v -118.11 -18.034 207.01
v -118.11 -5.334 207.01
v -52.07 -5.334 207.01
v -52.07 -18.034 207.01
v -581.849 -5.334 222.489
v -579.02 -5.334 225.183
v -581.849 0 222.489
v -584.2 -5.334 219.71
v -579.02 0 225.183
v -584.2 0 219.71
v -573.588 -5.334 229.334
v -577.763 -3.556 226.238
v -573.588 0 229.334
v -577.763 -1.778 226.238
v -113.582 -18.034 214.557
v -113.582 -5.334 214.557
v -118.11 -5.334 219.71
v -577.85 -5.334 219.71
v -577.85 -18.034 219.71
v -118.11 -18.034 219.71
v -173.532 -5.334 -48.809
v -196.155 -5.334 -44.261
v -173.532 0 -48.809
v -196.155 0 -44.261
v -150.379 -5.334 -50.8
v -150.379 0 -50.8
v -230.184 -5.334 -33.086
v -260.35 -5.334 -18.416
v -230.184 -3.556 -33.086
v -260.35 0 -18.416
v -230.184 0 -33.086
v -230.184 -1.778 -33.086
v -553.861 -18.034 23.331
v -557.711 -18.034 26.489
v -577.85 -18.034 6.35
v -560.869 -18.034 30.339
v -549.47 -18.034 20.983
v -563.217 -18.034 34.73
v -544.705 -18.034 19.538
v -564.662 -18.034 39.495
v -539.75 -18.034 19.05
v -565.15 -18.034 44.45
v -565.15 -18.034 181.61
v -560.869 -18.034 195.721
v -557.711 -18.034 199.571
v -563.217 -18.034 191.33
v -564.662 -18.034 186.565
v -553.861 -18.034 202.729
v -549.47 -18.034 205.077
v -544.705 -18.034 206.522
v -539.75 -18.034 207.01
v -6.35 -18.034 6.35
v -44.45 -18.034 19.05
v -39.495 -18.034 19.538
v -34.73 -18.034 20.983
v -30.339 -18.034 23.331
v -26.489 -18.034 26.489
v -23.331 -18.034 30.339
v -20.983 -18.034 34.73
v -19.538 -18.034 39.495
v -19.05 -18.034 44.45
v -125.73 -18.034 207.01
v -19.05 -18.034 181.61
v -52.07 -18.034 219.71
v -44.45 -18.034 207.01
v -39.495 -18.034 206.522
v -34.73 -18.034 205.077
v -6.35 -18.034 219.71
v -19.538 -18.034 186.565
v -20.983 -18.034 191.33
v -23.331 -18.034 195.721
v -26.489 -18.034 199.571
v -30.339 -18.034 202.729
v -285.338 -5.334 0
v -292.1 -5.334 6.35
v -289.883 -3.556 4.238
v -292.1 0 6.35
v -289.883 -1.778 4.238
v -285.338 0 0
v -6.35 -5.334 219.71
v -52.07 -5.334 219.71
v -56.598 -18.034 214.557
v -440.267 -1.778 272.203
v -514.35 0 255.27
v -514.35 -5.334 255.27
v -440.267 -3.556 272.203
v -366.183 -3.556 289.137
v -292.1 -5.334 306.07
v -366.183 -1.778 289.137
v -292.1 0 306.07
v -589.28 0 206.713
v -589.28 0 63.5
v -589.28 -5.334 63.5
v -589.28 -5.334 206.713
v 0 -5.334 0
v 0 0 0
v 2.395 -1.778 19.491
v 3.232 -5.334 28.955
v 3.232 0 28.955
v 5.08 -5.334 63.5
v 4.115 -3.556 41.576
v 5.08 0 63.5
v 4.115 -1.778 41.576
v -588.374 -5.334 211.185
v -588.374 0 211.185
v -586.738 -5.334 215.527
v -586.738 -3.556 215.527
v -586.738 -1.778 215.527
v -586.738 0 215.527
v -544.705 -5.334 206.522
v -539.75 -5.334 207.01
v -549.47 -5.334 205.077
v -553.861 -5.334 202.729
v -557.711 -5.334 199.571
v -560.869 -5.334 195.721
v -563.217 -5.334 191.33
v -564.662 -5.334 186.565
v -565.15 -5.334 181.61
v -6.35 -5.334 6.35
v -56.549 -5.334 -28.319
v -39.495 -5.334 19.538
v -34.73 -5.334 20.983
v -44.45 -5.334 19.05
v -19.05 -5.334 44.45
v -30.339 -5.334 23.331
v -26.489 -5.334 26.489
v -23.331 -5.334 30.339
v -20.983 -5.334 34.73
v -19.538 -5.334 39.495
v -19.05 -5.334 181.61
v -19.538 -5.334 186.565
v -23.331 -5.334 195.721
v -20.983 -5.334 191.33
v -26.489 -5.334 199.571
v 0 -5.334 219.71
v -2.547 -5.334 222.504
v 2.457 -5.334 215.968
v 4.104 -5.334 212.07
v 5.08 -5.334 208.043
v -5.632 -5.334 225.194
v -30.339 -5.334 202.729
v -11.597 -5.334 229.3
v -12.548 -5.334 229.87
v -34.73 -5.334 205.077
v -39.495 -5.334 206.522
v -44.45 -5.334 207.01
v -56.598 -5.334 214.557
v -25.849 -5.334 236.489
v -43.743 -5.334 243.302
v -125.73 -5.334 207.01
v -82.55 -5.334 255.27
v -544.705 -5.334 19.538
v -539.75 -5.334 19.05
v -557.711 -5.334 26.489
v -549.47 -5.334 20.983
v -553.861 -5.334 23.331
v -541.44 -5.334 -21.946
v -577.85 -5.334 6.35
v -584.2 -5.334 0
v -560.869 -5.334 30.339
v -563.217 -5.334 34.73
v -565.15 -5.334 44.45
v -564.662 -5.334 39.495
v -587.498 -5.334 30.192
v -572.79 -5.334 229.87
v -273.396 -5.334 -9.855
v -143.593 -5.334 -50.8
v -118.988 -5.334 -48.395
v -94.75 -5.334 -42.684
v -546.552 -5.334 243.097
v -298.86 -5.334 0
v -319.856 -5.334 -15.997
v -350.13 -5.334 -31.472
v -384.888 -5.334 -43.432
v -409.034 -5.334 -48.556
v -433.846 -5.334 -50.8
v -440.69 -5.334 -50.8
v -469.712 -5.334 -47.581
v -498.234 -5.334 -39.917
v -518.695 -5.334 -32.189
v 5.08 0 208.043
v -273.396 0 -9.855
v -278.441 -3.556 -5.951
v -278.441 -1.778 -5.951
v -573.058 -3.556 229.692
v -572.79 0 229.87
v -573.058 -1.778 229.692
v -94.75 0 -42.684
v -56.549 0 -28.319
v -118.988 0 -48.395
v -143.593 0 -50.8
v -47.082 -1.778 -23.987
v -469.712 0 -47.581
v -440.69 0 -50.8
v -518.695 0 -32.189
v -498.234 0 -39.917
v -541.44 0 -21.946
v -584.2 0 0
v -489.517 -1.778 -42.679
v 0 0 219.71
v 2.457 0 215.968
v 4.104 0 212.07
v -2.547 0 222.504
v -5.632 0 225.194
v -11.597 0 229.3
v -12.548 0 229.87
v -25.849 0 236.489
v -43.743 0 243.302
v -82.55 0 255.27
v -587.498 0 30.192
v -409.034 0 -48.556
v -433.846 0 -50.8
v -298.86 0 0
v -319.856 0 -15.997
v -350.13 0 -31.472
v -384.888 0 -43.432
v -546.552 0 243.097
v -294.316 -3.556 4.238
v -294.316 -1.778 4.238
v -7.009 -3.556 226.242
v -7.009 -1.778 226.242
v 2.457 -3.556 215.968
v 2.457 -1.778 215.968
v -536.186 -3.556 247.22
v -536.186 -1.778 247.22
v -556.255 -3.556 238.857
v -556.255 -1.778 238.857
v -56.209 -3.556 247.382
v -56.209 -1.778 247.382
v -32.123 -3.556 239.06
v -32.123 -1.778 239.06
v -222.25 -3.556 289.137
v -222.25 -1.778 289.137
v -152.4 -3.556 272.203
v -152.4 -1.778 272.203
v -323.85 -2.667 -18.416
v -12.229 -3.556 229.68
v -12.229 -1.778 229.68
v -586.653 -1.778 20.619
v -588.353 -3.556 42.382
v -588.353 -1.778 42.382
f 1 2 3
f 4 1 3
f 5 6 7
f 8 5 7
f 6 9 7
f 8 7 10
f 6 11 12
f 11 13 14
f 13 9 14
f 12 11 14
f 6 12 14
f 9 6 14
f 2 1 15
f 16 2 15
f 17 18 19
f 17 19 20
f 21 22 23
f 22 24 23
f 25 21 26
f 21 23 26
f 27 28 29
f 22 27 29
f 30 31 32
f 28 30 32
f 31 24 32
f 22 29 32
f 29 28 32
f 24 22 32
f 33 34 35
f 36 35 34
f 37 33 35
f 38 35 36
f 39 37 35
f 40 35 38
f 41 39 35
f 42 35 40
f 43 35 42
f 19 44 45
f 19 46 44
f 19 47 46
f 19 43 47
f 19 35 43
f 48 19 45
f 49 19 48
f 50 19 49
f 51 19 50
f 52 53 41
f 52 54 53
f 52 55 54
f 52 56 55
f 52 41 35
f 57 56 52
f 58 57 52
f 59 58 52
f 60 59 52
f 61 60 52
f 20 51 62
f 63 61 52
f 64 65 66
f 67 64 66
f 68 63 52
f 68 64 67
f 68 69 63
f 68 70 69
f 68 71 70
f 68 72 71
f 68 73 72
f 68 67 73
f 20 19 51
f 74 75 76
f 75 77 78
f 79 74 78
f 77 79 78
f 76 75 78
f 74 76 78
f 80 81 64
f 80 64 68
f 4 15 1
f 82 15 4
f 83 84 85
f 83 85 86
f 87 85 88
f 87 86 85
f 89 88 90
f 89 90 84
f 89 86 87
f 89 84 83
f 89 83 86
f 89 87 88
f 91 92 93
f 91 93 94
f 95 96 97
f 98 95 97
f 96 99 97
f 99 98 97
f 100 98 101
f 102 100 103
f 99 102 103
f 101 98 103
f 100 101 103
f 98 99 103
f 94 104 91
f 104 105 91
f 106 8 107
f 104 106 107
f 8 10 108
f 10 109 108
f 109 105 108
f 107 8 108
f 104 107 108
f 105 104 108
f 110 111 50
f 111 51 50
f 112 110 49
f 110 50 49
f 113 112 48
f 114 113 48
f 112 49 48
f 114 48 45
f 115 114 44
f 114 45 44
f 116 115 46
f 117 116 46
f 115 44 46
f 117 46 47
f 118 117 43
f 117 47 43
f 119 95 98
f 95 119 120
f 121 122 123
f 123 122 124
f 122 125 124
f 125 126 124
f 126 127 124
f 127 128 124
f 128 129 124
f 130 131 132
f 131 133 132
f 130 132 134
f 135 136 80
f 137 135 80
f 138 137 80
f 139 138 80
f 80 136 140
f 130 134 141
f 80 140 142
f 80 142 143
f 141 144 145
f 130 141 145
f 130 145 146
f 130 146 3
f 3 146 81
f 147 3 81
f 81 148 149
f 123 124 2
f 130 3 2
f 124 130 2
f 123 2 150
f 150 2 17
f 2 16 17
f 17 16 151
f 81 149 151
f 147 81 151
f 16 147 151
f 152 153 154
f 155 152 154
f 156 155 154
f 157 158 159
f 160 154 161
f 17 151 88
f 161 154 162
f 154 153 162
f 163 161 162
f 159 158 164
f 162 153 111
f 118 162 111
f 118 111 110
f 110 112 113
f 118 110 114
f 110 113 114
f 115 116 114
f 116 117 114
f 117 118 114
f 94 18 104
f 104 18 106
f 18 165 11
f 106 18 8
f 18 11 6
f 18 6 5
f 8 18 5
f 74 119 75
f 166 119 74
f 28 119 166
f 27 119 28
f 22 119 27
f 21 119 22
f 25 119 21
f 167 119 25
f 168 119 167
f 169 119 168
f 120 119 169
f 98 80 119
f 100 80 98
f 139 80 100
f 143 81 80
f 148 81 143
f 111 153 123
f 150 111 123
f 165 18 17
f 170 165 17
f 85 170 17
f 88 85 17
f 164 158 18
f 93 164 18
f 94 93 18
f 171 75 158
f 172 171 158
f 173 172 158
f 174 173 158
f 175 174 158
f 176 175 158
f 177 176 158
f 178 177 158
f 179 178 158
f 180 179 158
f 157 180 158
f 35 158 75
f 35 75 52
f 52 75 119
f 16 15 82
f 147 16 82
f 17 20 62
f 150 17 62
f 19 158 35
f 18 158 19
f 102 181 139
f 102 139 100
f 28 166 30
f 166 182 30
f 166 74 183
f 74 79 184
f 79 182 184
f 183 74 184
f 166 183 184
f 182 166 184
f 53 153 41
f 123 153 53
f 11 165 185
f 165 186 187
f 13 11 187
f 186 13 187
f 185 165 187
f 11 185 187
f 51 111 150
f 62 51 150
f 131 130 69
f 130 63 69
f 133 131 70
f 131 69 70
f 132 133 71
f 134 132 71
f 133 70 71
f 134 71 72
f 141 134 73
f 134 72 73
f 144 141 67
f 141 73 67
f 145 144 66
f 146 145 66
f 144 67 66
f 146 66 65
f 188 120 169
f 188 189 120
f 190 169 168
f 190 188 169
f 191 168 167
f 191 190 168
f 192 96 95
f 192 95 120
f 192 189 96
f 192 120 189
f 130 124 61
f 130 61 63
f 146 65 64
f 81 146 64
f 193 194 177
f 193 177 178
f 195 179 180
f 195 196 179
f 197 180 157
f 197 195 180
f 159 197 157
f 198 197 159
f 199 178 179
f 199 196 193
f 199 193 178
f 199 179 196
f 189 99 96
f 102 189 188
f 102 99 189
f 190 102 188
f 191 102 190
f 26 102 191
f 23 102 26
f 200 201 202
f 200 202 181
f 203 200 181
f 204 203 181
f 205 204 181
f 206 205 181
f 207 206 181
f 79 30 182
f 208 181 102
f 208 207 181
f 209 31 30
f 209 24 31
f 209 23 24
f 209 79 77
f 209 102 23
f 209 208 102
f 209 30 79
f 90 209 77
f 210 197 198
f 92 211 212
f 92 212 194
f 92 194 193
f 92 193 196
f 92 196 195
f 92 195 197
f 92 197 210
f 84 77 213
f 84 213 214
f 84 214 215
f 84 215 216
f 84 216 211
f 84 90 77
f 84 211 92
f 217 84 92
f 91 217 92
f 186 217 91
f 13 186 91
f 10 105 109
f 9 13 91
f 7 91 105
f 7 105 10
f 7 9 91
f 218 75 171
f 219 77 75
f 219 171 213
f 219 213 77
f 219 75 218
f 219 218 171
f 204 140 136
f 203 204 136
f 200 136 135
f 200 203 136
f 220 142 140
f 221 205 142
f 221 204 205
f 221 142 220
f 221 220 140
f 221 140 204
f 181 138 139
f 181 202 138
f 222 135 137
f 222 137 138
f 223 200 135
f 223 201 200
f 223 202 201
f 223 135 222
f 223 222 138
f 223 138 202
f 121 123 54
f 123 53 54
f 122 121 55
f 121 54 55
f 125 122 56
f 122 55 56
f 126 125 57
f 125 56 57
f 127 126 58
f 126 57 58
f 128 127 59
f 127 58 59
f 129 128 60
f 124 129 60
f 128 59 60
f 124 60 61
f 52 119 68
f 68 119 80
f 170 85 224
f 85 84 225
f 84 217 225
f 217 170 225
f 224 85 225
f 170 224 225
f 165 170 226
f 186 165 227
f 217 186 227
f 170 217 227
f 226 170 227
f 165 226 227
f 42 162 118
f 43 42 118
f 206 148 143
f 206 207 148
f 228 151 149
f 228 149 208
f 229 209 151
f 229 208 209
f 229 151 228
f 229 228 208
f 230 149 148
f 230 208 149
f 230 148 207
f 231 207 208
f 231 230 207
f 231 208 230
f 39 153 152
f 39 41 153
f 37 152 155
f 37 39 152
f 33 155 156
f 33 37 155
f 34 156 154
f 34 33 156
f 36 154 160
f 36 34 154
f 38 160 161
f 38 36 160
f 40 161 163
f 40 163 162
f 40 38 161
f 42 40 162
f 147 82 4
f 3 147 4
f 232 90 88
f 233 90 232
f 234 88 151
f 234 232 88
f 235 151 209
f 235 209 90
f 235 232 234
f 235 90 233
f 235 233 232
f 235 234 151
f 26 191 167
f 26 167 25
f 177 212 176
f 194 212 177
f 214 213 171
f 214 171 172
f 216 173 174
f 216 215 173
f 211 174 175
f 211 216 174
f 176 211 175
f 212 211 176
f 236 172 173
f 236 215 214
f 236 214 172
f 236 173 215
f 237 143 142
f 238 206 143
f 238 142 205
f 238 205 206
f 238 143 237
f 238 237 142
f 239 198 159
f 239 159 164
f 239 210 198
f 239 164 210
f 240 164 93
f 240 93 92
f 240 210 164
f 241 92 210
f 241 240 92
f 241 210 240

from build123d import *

# Parameters (mm, degrees)
F0_W     = 584.2
F0_H     = 219.71
F1_DEPTH = 5.334
F2_W     = 571.5
F2_H     = 213.36
F2_W_2   = 546.1
F2_H_2   = 187.96
F3_DEPTH = 12.7
F4_R     = 25.4
F6_DEPTH = 12.7
F8_DEPTH = 5.334
F9_DEPTH = 5.334


# Not quite as in the source:
# - a feature names something its author has since deleted; it is built from what else it names


with BuildPart() as f1:
    # F0 (on Front) → F1 (new body)
    with BuildSketch(Plane.XZ):
        with Locations((-292.1, 109.855)):
            Rectangle(F0_W, F0_H)
    extrude(amount=F1_DEPTH)

    # F2 (on face) → F3 (join)
    with BuildSketch(Plane.XZ.offset(5.334)):
        with Locations((-292.1, 113.03)):
            Rectangle(F2_W, F2_H)
        with Locations((-292.1, 113.03)):
            Rectangle(F2_W_2, F2_H_2, mode=Mode.SUBTRACT)
    extrude(amount=F3_DEPTH)

    # F4
    f4_edges = [f1.edges().sort_by_distance(p)[0] for p in [
        (-565.15, -11.684, 207.01),
        (-19.05, -11.684, 207.01),
        (-19.05, -11.684, 19.05),
        (-565.15, -11.684, 19.05),
    ]]
    fillet(f4_edges, radius=F4_R)

    # F5 (on face) → F6 (cut)
    with BuildSketch(Plane.XZ.offset(18.034)):
        Polygon((-118.11, 219.71), (-125.73, 207.01), (-118.11, 207.01), (-113.5820166854, 214.5566388576), (-110.49, 219.71), align=None)
        Polygon((-56.5979833146, 214.5566388576), (-52.07, 207.01), (-44.45, 207.01), (-52.07, 219.71), (-59.69, 219.71), align=None)
        Polygon((-59.69, 219.71), (-110.49, 219.71), (-113.5820166854, 214.5566388576), (-56.5979833146, 214.5566388576), align=None)
    extrude(amount=-F6_DEPTH, mode=Mode.SUBTRACT)

    # F7 (on face) → F8 (cut)
    with BuildSketch(Plane(origin=(0, 0, 0), x_dir=(-1, 0, 0), z_dir=(0, 1, 0))):
        with BuildLine():
            add(Edge.make_bspline(
                [(292.1, 6.35), (289.8878914708, 4.2388101088), (287.6757829415, 2.1276202176), (285.3383261504, 0)],
                knots=[0, 0, 0, 0, 0.0566650496, 0.0566650496, 0.0566650496, 0.0566650496], degree=3))
            Line((285.3383261504, 0), (292.1, 0))
            Line((292.1, 0), (292.1, 6.35))
        make_face()
        with BuildLine():
            add(Edge.make_bspline(
                [(292.1, 6.35), (294.3115112442, 4.2388053382), (296.5230224884, 2.1276106765), (298.8599853109, 0)],
                knots=[0, 0, 0, 0, 0.056662645, 0.056662645, 0.056662645, 0.056662645], degree=3))
            Line((292.1, 6.35), (292.1, 0))
            Line((292.1, 0), (298.8599853109, 0))
        make_face()
    extrude(amount=-F8_DEPTH, mode=Mode.SUBTRACT)

    # F7 (on face) → F9 (join)
    with BuildSketch(Plane(origin=(0, 0, 0), x_dir=(-1, 0, 0), z_dir=(0, 1, 0))):
        with BuildLine():
            Line((285.3383261504, 0), (0, 0))
            add(Edge.make_bspline(
                [(35.5548654074, -18.4164866805), (23.6750755263, -12.5314961521), (11.8375377632, -6.265748076), (0, 0)],
                knots=[0.8952858021, 0.8952858021, 0.8952858021, 0.8952858021, 1, 1, 1, 1], degree=3))
            Line((35.5548654074, -18.4164866805), (260.35, -18.4164866805))
            add(Edge.make_bspline(
                [(285.3383261504, 0), (278.8607301271, -5.8960937002), (271.4205053001, -11.9183662972), (260.35, -18.4164866805)],
                knots=[0.0566650496, 0.0566650496, 0.0566650496, 0.0566650496, 0.2136961022, 0.2136961022, 0.2136961022, 0.2136961022], degree=3))
        make_face()
        with BuildLine():
            add(Edge.make_bspline(
                [(0, 0), (-2.7059325948, 17.274832353), (-4.5181928473, 42.574440276), (-5.08, 63.5)],
                knots=[0, 0, 0, 0, 0.5267133936, 0.5267133936, 0.5267133936, 0.5267133936], degree=3))
            Line((0, 0), (0, 219.71))
            add(Edge.make_bspline(
                [(0, 219.71), (-2.907575848, 216.0546733014), (-4.393729889, 212.1257933571), (-5.08, 208.0429754021)],
                knots=[0.6401685719, 0.6401685719, 0.6401685719, 0.6401685719, 0.7975102285, 0.7975102285, 0.7975102285, 0.7975102285], degree=3))
            Line((-5.08, 208.0429754021), (-5.08, 191.77))
            Line((-5.08, 191.77), (-5.08, 114.935))
            Line((-5.08, 114.935), (-5.08, 63.5))
        make_face()
        with BuildLine():
            Line((260.35, -18.4164866805), (35.5548654074, -18.4164866805))
            add(Edge.make_bspline(
                [(143.5928555626, -50.8), (106.470496214, -50.0055886792), (70.8264502644, -35.8892656507), (35.5548654074, -18.4164866805)],
                knots=[0.5843850409, 0.5843850409, 0.5843850409, 0.5843850409, 0.8952858021, 0.8952858021, 0.8952858021, 0.8952858021], degree=3))
            Line((143.5928555626, -50.8), (150.3785817486, -50.8))
            add(Edge.make_bspline(
                [(260.35, -18.4164866805), (235.5497171967, -32.973656279), (192.5306851802, -49.9188924594), (150.3785817486, -50.8)],
                knots=[0.2136961022, 0.2136961022, 0.2136961022, 0.2136961022, 0.5654790071, 0.5654790071, 0.5654790071, 0.5654790071], degree=3))
        make_face()
        with BuildLine():
            add(Edge.make_bspline(
                [(11.5967126237, 229.2998559787), (6.6790583406, 226.3057112292), (2.7183257178, 223.1274064895), (0, 219.71)],
                knots=[0.4930680682, 0.4930680682, 0.4930680682, 0.4930680682, 0.6401685719, 0.6401685719, 0.6401685719, 0.6401685719], degree=3))
            Line((0, 219.71), (292.1, 219.71))
            Line((292.1, 219.71), (11.5967126237, 229.2998559787))
        make_face()
        with BuildLine():
            add(Edge.make_bspline(
                [(12.5483744012, 229.87), (12.2273175537, 229.6806902818), (11.9100723395, 229.4906470132), (11.5967126237, 229.2998559787)],
                knots=[0.4836946212, 0.4836946212, 0.4836946212, 0.4836946212, 0.4930680682, 0.4930680682, 0.4930680682, 0.4930680682], degree=3))
            Line((11.5967126237, 229.2998559787), (292.1, 219.71))
            Line((292.1, 219.71), (573.5876283802, 229.3335086626))
            add(Edge.make_bspline(
                [(572.7896932404, 229.87), (573.0585490403, 229.6916783135), (573.3245454934, 229.5128510633), (573.5876283802, 229.3335086626)],
                knots=[0.4655830842, 0.4655830842, 0.4655830842, 0.4655830842, 0.4744116019, 0.4744116019, 0.4744116019, 0.4744116019], degree=3))
            Line((572.7896932404, 229.87), (514.35, 229.87))
            Line((514.35, 229.87), (292.1, 229.87))
            Line((292.1, 229.87), (82.55, 229.87))
            Line((82.55, 229.87), (12.5483744012, 229.87))
        make_face()
        with BuildLine():
            Line((573.5876283802, 229.3335086626), (292.1, 219.71))
            Line((292.1, 219.71), (584.2, 219.71))
            add(Edge.make_bspline(
                [(573.5876283802, 229.3335086626), (578.0527057549, 226.2896858373), (581.6785208511, 223.0974722581), (584.2, 219.71)],
                knots=[0.4744116019, 0.4744116019, 0.4744116019, 0.4744116019, 0.6242503674, 0.6242503674, 0.6242503674, 0.6242503674], degree=3))
        make_face()
        with BuildLine():
            add(Edge.make_bspline(
                [(298.8599853109, 0), (305.3364495341, -5.8962831133), (312.7764065366, -11.9186444461), (323.85, -18.4164866805)],
                knots=[0.056662645, 0.056662645, 0.056662645, 0.056662645, 0.2136927825, 0.2136927825, 0.2136927825, 0.2136927825], degree=3))
            Line((323.85, -18.4164866805), (548.6673215949, -18.4164866805))
            add(Edge.make_bspline(
                [(548.6673215949, -18.4164866805), (560.540064076, -12.5314899408), (572.370032038, -6.2657449704), (584.2, 0)],
                knots=[0.8952964295, 0.8952964295, 0.8952964295, 0.8952964295, 1, 1, 1, 1], degree=3))
            Line((584.2, 0), (298.8599853109, 0))
        make_face()
        with BuildLine():
            Line((548.6673215949, -18.4164866805), (323.85, -18.4164866805))
            add(Edge.make_bspline(
                [(323.85, -18.4164866805), (348.6543054028, -32.9713340996), (391.6899454814, -49.9118498543), (433.8458201185, -50.8)],
                knots=[0.2136927825, 0.2136927825, 0.2136927825, 0.2136927825, 0.5654325768, 0.5654325768, 0.5654325768, 0.5654325768], degree=3))
            Line((433.8458201185, -50.8), (440.69, -50.8))
            add(Edge.make_bspline(
                [(440.69, -50.8), (477.8051745876, -49.9992725657), (513.4246952416, -35.8853016167), (548.6673215949, -18.4164866805)],
                knots=[0.5844980763, 0.5844980763, 0.5844980763, 0.5844980763, 0.8952964295, 0.8952964295, 0.8952964295, 0.8952964295], degree=3))
        make_face()
        with BuildLine():
            add(Edge.make_bspline(
                [(82.55, 255.27), (55.8328777889, 247.4544406939), (29.1157555777, 239.6388813877), (12.5483744012, 229.87)],
                knots=[0, 0, 0, 0, 0.4836946212, 0.4836946212, 0.4836946212, 0.4836946212], degree=3))
            Line((12.5483744012, 229.87), (82.55, 229.87))
            Line((82.55, 229.87), (82.55, 255.27))
        make_face()
        with BuildLine():
            add(Edge.make_bspline(
                [(584.2, 219.71), (587.2466521414, 215.6169859397), (588.681040168, 211.2389059428), (589.28, 206.7131131)],
                knots=[0.6242503674, 0.6242503674, 0.6242503674, 0.6242503674, 0.8052975103, 0.8052975103, 0.8052975103, 0.8052975103], degree=3))
            Line((584.2, 219.71), (584.2, 0))
            add(Edge.make_bspline(
                [(584.2, 0), (587.0231389999, 19.4493960589), (588.7459289581, 43.301401327), (589.28, 63.5)],
                knots=[0, 0, 0, 0, 0.5267133936, 0.5267133936, 0.5267133936, 0.5267133936], degree=3))
            Line((589.28, 63.5), (589.28, 114.935))
            Line((589.28, 114.935), (589.28, 191.77))
            Line((589.28, 191.77), (589.28, 206.7131131))
        make_face()
        with BuildLine():
            Line((82.55, 255.27), (82.55, 229.87))
            Line((82.55, 229.87), (292.1, 229.87))
            Line((292.1, 229.87), (292.1, 306.07))
            add(Edge.make_bspline(
                [(292.1, 306.07), (222.25, 289.1366666667), (152.4, 272.2033333333), (82.55, 255.27)],
                knots=[0, 0, 0, 0, 215.6196709486, 215.6196709486, 215.6196709486, 215.6196709486], degree=3))
        make_face()
        with BuildLine():
            Line((514.35, 229.87), (572.7896932404, 229.87))
            add(Edge.make_bspline(
                [(514.35, 255.27), (536.4806207919, 247.2720101715), (558.6112415838, 239.274020343), (572.7896932404, 229.87)],
                knots=[0, 0, 0, 0, 0.4655830842, 0.4655830842, 0.4655830842, 0.4655830842], degree=3))
            Line((514.35, 255.27), (514.35, 229.87))
        make_face()
        with BuildLine():
            Line((292.1, 306.07), (292.1, 229.87))
            Line((292.1, 229.87), (514.35, 229.87))
            Line((514.35, 229.87), (514.35, 255.27))
            add(Edge.make_bspline(
                [(514.35, 255.27), (440.2666666667, 272.2033333333), (366.1833333333, 289.1366666667), (292.1, 306.07)],
                knots=[0, 0, 0, 0, 227.9818030019, 227.9818030019, 227.9818030019, 227.9818030019], degree=3))
        make_face()
    extrude(amount=-F9_DEPTH)


solid = f1.part
